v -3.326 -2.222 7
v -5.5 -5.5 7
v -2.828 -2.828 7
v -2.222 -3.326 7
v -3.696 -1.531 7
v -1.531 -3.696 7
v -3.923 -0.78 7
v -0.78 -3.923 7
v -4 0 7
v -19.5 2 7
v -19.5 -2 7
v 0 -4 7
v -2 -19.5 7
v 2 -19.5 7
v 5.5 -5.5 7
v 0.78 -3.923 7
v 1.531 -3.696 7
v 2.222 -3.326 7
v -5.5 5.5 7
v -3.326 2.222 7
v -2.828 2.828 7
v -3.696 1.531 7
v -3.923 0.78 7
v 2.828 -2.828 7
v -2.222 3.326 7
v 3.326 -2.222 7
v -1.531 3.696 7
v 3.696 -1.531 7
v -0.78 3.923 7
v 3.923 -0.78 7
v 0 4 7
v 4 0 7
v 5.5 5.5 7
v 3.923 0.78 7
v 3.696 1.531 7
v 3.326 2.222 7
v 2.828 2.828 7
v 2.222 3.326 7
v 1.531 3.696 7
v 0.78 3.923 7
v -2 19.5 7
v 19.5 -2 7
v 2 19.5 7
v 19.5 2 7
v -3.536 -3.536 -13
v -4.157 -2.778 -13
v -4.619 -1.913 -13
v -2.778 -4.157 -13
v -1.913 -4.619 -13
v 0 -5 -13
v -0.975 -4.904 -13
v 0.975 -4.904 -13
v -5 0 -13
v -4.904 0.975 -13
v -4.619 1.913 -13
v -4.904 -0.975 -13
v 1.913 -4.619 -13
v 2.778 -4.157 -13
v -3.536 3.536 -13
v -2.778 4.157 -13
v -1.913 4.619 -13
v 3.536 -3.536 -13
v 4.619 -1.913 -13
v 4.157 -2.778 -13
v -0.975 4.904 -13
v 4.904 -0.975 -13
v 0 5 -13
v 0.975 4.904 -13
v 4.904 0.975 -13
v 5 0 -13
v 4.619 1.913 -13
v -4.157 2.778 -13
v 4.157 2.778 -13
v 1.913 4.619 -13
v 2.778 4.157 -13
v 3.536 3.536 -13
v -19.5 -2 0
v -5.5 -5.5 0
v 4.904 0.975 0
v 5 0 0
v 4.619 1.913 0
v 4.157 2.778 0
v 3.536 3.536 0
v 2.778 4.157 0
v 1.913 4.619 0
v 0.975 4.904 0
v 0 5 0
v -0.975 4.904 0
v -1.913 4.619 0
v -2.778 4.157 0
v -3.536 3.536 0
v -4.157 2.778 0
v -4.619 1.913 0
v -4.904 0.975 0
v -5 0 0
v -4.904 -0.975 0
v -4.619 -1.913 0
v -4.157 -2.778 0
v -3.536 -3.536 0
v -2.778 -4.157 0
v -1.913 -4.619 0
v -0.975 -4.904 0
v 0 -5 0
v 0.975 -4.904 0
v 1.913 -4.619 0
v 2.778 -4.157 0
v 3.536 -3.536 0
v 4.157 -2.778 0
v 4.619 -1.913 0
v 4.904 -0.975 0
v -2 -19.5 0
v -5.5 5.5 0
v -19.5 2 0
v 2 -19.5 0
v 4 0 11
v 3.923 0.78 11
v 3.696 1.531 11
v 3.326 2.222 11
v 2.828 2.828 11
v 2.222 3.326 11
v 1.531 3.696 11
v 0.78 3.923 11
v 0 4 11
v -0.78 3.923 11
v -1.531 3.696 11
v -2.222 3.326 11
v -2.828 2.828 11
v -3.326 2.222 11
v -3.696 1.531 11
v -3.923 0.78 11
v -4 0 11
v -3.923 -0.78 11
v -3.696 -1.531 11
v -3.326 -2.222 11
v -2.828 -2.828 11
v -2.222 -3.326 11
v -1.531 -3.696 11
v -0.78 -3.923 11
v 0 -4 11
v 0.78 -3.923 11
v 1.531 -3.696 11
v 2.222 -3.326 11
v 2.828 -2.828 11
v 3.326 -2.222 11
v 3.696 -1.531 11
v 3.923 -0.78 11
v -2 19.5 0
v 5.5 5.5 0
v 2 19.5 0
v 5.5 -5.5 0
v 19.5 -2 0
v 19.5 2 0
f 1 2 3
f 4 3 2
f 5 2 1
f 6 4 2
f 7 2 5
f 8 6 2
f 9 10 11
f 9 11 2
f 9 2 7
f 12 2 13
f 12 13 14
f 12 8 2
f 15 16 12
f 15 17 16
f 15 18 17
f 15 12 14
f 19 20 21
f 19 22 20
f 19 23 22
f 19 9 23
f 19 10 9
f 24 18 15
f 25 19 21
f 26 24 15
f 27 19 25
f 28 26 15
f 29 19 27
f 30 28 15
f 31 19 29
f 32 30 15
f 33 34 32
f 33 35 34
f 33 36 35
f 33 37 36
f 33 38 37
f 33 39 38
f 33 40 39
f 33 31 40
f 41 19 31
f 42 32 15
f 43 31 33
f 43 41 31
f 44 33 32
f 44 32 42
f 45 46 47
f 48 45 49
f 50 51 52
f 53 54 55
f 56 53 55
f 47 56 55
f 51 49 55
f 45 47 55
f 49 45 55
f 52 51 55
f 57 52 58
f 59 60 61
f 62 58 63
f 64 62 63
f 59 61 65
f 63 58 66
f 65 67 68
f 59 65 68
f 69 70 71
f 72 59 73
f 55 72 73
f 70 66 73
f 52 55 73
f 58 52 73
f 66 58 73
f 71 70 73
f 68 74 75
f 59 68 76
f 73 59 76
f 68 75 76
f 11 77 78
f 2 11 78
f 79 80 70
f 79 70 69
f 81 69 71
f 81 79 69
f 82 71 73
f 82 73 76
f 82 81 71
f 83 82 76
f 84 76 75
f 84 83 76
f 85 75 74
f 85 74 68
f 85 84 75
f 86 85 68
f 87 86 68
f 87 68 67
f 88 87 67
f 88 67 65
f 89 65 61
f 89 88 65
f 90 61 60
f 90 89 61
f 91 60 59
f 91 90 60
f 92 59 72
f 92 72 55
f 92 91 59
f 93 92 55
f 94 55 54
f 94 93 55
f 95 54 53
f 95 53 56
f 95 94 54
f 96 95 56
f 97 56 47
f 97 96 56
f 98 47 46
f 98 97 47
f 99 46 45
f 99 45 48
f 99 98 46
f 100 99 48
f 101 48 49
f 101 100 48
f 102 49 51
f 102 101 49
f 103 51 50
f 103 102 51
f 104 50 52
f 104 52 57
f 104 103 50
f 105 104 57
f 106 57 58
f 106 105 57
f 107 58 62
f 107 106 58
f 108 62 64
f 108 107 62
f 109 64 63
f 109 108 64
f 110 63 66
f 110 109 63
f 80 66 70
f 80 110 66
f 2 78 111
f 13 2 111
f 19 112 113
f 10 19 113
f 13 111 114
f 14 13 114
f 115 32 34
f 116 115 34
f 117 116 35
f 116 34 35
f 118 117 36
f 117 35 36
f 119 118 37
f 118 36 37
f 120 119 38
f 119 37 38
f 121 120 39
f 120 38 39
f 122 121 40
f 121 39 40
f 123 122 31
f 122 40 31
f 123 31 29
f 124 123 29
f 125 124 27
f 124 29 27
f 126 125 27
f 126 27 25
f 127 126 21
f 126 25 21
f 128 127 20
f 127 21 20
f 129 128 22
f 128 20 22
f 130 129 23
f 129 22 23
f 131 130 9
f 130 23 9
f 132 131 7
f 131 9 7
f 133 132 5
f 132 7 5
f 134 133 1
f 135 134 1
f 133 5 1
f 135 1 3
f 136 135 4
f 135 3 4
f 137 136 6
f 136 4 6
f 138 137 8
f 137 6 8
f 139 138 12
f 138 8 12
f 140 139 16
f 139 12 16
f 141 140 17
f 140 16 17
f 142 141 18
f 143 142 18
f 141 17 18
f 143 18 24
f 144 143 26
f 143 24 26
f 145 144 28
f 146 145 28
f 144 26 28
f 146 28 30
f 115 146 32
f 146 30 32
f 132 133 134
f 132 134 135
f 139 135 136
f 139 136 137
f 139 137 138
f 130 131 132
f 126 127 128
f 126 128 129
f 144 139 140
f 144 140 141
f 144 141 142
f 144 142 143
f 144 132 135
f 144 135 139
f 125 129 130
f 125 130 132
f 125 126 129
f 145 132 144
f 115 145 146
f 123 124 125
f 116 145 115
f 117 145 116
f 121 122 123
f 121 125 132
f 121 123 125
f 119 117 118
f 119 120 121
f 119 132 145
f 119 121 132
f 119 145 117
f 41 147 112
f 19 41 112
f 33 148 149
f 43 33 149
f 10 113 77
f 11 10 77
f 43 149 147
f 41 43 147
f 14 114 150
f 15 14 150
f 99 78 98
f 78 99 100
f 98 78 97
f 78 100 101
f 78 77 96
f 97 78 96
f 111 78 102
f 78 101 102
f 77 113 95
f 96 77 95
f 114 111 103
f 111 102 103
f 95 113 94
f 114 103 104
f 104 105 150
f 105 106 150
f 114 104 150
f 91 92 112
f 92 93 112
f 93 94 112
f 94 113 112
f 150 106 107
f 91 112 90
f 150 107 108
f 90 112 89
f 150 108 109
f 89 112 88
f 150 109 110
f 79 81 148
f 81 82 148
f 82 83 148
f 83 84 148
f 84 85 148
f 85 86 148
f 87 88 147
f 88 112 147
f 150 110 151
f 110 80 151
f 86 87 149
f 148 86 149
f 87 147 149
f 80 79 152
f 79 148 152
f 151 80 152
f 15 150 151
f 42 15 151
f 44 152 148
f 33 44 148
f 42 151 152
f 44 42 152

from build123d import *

# Parameters (mm, degrees)
F0_W     = 11
F0_H     = 11
F0_R     = 5
F1_DEPTH = 7
F2_DEPTH = 13
F3_R     = 4
F4_DEPTH = 4


with BuildPart() as f1:
    # F0 (on Top) → F1 (new body)
    with BuildSketch(Plane.XY):
        Rectangle(F0_W, F0_H)
        Circle(F0_R, mode=Mode.SUBTRACT)
        Circle(F0_R)
        Polygon((2, -19.5), (5.5, -5.5), (-5.5, -5.5), (-2, -19.5), align=None)
        Polygon((5.5, 5.5), (5.5, -5.5), (19.5, -2), (19.5, 2), align=None)
        Polygon((-19.5, -2), (-5.5, -5.5), (-5.5, 5.5), (-19.5, 2), align=None)
        Polygon((-5.5, 5.5), (5.5, 5.5), (2, 19.5), (-2, 19.5), align=None)
    extrude(amount=F1_DEPTH)

    # F0 (on Top) → F2 (join)
    with BuildSketch(Plane.XY):
        Circle(F0_R)
    extrude(amount=-F2_DEPTH)

    # F3 (on face) → F4 (join)
    with BuildSketch(Plane.XY.offset(7)):
        Circle(F3_R)
    extrude(amount=F4_DEPTH)


solid = f1.part
